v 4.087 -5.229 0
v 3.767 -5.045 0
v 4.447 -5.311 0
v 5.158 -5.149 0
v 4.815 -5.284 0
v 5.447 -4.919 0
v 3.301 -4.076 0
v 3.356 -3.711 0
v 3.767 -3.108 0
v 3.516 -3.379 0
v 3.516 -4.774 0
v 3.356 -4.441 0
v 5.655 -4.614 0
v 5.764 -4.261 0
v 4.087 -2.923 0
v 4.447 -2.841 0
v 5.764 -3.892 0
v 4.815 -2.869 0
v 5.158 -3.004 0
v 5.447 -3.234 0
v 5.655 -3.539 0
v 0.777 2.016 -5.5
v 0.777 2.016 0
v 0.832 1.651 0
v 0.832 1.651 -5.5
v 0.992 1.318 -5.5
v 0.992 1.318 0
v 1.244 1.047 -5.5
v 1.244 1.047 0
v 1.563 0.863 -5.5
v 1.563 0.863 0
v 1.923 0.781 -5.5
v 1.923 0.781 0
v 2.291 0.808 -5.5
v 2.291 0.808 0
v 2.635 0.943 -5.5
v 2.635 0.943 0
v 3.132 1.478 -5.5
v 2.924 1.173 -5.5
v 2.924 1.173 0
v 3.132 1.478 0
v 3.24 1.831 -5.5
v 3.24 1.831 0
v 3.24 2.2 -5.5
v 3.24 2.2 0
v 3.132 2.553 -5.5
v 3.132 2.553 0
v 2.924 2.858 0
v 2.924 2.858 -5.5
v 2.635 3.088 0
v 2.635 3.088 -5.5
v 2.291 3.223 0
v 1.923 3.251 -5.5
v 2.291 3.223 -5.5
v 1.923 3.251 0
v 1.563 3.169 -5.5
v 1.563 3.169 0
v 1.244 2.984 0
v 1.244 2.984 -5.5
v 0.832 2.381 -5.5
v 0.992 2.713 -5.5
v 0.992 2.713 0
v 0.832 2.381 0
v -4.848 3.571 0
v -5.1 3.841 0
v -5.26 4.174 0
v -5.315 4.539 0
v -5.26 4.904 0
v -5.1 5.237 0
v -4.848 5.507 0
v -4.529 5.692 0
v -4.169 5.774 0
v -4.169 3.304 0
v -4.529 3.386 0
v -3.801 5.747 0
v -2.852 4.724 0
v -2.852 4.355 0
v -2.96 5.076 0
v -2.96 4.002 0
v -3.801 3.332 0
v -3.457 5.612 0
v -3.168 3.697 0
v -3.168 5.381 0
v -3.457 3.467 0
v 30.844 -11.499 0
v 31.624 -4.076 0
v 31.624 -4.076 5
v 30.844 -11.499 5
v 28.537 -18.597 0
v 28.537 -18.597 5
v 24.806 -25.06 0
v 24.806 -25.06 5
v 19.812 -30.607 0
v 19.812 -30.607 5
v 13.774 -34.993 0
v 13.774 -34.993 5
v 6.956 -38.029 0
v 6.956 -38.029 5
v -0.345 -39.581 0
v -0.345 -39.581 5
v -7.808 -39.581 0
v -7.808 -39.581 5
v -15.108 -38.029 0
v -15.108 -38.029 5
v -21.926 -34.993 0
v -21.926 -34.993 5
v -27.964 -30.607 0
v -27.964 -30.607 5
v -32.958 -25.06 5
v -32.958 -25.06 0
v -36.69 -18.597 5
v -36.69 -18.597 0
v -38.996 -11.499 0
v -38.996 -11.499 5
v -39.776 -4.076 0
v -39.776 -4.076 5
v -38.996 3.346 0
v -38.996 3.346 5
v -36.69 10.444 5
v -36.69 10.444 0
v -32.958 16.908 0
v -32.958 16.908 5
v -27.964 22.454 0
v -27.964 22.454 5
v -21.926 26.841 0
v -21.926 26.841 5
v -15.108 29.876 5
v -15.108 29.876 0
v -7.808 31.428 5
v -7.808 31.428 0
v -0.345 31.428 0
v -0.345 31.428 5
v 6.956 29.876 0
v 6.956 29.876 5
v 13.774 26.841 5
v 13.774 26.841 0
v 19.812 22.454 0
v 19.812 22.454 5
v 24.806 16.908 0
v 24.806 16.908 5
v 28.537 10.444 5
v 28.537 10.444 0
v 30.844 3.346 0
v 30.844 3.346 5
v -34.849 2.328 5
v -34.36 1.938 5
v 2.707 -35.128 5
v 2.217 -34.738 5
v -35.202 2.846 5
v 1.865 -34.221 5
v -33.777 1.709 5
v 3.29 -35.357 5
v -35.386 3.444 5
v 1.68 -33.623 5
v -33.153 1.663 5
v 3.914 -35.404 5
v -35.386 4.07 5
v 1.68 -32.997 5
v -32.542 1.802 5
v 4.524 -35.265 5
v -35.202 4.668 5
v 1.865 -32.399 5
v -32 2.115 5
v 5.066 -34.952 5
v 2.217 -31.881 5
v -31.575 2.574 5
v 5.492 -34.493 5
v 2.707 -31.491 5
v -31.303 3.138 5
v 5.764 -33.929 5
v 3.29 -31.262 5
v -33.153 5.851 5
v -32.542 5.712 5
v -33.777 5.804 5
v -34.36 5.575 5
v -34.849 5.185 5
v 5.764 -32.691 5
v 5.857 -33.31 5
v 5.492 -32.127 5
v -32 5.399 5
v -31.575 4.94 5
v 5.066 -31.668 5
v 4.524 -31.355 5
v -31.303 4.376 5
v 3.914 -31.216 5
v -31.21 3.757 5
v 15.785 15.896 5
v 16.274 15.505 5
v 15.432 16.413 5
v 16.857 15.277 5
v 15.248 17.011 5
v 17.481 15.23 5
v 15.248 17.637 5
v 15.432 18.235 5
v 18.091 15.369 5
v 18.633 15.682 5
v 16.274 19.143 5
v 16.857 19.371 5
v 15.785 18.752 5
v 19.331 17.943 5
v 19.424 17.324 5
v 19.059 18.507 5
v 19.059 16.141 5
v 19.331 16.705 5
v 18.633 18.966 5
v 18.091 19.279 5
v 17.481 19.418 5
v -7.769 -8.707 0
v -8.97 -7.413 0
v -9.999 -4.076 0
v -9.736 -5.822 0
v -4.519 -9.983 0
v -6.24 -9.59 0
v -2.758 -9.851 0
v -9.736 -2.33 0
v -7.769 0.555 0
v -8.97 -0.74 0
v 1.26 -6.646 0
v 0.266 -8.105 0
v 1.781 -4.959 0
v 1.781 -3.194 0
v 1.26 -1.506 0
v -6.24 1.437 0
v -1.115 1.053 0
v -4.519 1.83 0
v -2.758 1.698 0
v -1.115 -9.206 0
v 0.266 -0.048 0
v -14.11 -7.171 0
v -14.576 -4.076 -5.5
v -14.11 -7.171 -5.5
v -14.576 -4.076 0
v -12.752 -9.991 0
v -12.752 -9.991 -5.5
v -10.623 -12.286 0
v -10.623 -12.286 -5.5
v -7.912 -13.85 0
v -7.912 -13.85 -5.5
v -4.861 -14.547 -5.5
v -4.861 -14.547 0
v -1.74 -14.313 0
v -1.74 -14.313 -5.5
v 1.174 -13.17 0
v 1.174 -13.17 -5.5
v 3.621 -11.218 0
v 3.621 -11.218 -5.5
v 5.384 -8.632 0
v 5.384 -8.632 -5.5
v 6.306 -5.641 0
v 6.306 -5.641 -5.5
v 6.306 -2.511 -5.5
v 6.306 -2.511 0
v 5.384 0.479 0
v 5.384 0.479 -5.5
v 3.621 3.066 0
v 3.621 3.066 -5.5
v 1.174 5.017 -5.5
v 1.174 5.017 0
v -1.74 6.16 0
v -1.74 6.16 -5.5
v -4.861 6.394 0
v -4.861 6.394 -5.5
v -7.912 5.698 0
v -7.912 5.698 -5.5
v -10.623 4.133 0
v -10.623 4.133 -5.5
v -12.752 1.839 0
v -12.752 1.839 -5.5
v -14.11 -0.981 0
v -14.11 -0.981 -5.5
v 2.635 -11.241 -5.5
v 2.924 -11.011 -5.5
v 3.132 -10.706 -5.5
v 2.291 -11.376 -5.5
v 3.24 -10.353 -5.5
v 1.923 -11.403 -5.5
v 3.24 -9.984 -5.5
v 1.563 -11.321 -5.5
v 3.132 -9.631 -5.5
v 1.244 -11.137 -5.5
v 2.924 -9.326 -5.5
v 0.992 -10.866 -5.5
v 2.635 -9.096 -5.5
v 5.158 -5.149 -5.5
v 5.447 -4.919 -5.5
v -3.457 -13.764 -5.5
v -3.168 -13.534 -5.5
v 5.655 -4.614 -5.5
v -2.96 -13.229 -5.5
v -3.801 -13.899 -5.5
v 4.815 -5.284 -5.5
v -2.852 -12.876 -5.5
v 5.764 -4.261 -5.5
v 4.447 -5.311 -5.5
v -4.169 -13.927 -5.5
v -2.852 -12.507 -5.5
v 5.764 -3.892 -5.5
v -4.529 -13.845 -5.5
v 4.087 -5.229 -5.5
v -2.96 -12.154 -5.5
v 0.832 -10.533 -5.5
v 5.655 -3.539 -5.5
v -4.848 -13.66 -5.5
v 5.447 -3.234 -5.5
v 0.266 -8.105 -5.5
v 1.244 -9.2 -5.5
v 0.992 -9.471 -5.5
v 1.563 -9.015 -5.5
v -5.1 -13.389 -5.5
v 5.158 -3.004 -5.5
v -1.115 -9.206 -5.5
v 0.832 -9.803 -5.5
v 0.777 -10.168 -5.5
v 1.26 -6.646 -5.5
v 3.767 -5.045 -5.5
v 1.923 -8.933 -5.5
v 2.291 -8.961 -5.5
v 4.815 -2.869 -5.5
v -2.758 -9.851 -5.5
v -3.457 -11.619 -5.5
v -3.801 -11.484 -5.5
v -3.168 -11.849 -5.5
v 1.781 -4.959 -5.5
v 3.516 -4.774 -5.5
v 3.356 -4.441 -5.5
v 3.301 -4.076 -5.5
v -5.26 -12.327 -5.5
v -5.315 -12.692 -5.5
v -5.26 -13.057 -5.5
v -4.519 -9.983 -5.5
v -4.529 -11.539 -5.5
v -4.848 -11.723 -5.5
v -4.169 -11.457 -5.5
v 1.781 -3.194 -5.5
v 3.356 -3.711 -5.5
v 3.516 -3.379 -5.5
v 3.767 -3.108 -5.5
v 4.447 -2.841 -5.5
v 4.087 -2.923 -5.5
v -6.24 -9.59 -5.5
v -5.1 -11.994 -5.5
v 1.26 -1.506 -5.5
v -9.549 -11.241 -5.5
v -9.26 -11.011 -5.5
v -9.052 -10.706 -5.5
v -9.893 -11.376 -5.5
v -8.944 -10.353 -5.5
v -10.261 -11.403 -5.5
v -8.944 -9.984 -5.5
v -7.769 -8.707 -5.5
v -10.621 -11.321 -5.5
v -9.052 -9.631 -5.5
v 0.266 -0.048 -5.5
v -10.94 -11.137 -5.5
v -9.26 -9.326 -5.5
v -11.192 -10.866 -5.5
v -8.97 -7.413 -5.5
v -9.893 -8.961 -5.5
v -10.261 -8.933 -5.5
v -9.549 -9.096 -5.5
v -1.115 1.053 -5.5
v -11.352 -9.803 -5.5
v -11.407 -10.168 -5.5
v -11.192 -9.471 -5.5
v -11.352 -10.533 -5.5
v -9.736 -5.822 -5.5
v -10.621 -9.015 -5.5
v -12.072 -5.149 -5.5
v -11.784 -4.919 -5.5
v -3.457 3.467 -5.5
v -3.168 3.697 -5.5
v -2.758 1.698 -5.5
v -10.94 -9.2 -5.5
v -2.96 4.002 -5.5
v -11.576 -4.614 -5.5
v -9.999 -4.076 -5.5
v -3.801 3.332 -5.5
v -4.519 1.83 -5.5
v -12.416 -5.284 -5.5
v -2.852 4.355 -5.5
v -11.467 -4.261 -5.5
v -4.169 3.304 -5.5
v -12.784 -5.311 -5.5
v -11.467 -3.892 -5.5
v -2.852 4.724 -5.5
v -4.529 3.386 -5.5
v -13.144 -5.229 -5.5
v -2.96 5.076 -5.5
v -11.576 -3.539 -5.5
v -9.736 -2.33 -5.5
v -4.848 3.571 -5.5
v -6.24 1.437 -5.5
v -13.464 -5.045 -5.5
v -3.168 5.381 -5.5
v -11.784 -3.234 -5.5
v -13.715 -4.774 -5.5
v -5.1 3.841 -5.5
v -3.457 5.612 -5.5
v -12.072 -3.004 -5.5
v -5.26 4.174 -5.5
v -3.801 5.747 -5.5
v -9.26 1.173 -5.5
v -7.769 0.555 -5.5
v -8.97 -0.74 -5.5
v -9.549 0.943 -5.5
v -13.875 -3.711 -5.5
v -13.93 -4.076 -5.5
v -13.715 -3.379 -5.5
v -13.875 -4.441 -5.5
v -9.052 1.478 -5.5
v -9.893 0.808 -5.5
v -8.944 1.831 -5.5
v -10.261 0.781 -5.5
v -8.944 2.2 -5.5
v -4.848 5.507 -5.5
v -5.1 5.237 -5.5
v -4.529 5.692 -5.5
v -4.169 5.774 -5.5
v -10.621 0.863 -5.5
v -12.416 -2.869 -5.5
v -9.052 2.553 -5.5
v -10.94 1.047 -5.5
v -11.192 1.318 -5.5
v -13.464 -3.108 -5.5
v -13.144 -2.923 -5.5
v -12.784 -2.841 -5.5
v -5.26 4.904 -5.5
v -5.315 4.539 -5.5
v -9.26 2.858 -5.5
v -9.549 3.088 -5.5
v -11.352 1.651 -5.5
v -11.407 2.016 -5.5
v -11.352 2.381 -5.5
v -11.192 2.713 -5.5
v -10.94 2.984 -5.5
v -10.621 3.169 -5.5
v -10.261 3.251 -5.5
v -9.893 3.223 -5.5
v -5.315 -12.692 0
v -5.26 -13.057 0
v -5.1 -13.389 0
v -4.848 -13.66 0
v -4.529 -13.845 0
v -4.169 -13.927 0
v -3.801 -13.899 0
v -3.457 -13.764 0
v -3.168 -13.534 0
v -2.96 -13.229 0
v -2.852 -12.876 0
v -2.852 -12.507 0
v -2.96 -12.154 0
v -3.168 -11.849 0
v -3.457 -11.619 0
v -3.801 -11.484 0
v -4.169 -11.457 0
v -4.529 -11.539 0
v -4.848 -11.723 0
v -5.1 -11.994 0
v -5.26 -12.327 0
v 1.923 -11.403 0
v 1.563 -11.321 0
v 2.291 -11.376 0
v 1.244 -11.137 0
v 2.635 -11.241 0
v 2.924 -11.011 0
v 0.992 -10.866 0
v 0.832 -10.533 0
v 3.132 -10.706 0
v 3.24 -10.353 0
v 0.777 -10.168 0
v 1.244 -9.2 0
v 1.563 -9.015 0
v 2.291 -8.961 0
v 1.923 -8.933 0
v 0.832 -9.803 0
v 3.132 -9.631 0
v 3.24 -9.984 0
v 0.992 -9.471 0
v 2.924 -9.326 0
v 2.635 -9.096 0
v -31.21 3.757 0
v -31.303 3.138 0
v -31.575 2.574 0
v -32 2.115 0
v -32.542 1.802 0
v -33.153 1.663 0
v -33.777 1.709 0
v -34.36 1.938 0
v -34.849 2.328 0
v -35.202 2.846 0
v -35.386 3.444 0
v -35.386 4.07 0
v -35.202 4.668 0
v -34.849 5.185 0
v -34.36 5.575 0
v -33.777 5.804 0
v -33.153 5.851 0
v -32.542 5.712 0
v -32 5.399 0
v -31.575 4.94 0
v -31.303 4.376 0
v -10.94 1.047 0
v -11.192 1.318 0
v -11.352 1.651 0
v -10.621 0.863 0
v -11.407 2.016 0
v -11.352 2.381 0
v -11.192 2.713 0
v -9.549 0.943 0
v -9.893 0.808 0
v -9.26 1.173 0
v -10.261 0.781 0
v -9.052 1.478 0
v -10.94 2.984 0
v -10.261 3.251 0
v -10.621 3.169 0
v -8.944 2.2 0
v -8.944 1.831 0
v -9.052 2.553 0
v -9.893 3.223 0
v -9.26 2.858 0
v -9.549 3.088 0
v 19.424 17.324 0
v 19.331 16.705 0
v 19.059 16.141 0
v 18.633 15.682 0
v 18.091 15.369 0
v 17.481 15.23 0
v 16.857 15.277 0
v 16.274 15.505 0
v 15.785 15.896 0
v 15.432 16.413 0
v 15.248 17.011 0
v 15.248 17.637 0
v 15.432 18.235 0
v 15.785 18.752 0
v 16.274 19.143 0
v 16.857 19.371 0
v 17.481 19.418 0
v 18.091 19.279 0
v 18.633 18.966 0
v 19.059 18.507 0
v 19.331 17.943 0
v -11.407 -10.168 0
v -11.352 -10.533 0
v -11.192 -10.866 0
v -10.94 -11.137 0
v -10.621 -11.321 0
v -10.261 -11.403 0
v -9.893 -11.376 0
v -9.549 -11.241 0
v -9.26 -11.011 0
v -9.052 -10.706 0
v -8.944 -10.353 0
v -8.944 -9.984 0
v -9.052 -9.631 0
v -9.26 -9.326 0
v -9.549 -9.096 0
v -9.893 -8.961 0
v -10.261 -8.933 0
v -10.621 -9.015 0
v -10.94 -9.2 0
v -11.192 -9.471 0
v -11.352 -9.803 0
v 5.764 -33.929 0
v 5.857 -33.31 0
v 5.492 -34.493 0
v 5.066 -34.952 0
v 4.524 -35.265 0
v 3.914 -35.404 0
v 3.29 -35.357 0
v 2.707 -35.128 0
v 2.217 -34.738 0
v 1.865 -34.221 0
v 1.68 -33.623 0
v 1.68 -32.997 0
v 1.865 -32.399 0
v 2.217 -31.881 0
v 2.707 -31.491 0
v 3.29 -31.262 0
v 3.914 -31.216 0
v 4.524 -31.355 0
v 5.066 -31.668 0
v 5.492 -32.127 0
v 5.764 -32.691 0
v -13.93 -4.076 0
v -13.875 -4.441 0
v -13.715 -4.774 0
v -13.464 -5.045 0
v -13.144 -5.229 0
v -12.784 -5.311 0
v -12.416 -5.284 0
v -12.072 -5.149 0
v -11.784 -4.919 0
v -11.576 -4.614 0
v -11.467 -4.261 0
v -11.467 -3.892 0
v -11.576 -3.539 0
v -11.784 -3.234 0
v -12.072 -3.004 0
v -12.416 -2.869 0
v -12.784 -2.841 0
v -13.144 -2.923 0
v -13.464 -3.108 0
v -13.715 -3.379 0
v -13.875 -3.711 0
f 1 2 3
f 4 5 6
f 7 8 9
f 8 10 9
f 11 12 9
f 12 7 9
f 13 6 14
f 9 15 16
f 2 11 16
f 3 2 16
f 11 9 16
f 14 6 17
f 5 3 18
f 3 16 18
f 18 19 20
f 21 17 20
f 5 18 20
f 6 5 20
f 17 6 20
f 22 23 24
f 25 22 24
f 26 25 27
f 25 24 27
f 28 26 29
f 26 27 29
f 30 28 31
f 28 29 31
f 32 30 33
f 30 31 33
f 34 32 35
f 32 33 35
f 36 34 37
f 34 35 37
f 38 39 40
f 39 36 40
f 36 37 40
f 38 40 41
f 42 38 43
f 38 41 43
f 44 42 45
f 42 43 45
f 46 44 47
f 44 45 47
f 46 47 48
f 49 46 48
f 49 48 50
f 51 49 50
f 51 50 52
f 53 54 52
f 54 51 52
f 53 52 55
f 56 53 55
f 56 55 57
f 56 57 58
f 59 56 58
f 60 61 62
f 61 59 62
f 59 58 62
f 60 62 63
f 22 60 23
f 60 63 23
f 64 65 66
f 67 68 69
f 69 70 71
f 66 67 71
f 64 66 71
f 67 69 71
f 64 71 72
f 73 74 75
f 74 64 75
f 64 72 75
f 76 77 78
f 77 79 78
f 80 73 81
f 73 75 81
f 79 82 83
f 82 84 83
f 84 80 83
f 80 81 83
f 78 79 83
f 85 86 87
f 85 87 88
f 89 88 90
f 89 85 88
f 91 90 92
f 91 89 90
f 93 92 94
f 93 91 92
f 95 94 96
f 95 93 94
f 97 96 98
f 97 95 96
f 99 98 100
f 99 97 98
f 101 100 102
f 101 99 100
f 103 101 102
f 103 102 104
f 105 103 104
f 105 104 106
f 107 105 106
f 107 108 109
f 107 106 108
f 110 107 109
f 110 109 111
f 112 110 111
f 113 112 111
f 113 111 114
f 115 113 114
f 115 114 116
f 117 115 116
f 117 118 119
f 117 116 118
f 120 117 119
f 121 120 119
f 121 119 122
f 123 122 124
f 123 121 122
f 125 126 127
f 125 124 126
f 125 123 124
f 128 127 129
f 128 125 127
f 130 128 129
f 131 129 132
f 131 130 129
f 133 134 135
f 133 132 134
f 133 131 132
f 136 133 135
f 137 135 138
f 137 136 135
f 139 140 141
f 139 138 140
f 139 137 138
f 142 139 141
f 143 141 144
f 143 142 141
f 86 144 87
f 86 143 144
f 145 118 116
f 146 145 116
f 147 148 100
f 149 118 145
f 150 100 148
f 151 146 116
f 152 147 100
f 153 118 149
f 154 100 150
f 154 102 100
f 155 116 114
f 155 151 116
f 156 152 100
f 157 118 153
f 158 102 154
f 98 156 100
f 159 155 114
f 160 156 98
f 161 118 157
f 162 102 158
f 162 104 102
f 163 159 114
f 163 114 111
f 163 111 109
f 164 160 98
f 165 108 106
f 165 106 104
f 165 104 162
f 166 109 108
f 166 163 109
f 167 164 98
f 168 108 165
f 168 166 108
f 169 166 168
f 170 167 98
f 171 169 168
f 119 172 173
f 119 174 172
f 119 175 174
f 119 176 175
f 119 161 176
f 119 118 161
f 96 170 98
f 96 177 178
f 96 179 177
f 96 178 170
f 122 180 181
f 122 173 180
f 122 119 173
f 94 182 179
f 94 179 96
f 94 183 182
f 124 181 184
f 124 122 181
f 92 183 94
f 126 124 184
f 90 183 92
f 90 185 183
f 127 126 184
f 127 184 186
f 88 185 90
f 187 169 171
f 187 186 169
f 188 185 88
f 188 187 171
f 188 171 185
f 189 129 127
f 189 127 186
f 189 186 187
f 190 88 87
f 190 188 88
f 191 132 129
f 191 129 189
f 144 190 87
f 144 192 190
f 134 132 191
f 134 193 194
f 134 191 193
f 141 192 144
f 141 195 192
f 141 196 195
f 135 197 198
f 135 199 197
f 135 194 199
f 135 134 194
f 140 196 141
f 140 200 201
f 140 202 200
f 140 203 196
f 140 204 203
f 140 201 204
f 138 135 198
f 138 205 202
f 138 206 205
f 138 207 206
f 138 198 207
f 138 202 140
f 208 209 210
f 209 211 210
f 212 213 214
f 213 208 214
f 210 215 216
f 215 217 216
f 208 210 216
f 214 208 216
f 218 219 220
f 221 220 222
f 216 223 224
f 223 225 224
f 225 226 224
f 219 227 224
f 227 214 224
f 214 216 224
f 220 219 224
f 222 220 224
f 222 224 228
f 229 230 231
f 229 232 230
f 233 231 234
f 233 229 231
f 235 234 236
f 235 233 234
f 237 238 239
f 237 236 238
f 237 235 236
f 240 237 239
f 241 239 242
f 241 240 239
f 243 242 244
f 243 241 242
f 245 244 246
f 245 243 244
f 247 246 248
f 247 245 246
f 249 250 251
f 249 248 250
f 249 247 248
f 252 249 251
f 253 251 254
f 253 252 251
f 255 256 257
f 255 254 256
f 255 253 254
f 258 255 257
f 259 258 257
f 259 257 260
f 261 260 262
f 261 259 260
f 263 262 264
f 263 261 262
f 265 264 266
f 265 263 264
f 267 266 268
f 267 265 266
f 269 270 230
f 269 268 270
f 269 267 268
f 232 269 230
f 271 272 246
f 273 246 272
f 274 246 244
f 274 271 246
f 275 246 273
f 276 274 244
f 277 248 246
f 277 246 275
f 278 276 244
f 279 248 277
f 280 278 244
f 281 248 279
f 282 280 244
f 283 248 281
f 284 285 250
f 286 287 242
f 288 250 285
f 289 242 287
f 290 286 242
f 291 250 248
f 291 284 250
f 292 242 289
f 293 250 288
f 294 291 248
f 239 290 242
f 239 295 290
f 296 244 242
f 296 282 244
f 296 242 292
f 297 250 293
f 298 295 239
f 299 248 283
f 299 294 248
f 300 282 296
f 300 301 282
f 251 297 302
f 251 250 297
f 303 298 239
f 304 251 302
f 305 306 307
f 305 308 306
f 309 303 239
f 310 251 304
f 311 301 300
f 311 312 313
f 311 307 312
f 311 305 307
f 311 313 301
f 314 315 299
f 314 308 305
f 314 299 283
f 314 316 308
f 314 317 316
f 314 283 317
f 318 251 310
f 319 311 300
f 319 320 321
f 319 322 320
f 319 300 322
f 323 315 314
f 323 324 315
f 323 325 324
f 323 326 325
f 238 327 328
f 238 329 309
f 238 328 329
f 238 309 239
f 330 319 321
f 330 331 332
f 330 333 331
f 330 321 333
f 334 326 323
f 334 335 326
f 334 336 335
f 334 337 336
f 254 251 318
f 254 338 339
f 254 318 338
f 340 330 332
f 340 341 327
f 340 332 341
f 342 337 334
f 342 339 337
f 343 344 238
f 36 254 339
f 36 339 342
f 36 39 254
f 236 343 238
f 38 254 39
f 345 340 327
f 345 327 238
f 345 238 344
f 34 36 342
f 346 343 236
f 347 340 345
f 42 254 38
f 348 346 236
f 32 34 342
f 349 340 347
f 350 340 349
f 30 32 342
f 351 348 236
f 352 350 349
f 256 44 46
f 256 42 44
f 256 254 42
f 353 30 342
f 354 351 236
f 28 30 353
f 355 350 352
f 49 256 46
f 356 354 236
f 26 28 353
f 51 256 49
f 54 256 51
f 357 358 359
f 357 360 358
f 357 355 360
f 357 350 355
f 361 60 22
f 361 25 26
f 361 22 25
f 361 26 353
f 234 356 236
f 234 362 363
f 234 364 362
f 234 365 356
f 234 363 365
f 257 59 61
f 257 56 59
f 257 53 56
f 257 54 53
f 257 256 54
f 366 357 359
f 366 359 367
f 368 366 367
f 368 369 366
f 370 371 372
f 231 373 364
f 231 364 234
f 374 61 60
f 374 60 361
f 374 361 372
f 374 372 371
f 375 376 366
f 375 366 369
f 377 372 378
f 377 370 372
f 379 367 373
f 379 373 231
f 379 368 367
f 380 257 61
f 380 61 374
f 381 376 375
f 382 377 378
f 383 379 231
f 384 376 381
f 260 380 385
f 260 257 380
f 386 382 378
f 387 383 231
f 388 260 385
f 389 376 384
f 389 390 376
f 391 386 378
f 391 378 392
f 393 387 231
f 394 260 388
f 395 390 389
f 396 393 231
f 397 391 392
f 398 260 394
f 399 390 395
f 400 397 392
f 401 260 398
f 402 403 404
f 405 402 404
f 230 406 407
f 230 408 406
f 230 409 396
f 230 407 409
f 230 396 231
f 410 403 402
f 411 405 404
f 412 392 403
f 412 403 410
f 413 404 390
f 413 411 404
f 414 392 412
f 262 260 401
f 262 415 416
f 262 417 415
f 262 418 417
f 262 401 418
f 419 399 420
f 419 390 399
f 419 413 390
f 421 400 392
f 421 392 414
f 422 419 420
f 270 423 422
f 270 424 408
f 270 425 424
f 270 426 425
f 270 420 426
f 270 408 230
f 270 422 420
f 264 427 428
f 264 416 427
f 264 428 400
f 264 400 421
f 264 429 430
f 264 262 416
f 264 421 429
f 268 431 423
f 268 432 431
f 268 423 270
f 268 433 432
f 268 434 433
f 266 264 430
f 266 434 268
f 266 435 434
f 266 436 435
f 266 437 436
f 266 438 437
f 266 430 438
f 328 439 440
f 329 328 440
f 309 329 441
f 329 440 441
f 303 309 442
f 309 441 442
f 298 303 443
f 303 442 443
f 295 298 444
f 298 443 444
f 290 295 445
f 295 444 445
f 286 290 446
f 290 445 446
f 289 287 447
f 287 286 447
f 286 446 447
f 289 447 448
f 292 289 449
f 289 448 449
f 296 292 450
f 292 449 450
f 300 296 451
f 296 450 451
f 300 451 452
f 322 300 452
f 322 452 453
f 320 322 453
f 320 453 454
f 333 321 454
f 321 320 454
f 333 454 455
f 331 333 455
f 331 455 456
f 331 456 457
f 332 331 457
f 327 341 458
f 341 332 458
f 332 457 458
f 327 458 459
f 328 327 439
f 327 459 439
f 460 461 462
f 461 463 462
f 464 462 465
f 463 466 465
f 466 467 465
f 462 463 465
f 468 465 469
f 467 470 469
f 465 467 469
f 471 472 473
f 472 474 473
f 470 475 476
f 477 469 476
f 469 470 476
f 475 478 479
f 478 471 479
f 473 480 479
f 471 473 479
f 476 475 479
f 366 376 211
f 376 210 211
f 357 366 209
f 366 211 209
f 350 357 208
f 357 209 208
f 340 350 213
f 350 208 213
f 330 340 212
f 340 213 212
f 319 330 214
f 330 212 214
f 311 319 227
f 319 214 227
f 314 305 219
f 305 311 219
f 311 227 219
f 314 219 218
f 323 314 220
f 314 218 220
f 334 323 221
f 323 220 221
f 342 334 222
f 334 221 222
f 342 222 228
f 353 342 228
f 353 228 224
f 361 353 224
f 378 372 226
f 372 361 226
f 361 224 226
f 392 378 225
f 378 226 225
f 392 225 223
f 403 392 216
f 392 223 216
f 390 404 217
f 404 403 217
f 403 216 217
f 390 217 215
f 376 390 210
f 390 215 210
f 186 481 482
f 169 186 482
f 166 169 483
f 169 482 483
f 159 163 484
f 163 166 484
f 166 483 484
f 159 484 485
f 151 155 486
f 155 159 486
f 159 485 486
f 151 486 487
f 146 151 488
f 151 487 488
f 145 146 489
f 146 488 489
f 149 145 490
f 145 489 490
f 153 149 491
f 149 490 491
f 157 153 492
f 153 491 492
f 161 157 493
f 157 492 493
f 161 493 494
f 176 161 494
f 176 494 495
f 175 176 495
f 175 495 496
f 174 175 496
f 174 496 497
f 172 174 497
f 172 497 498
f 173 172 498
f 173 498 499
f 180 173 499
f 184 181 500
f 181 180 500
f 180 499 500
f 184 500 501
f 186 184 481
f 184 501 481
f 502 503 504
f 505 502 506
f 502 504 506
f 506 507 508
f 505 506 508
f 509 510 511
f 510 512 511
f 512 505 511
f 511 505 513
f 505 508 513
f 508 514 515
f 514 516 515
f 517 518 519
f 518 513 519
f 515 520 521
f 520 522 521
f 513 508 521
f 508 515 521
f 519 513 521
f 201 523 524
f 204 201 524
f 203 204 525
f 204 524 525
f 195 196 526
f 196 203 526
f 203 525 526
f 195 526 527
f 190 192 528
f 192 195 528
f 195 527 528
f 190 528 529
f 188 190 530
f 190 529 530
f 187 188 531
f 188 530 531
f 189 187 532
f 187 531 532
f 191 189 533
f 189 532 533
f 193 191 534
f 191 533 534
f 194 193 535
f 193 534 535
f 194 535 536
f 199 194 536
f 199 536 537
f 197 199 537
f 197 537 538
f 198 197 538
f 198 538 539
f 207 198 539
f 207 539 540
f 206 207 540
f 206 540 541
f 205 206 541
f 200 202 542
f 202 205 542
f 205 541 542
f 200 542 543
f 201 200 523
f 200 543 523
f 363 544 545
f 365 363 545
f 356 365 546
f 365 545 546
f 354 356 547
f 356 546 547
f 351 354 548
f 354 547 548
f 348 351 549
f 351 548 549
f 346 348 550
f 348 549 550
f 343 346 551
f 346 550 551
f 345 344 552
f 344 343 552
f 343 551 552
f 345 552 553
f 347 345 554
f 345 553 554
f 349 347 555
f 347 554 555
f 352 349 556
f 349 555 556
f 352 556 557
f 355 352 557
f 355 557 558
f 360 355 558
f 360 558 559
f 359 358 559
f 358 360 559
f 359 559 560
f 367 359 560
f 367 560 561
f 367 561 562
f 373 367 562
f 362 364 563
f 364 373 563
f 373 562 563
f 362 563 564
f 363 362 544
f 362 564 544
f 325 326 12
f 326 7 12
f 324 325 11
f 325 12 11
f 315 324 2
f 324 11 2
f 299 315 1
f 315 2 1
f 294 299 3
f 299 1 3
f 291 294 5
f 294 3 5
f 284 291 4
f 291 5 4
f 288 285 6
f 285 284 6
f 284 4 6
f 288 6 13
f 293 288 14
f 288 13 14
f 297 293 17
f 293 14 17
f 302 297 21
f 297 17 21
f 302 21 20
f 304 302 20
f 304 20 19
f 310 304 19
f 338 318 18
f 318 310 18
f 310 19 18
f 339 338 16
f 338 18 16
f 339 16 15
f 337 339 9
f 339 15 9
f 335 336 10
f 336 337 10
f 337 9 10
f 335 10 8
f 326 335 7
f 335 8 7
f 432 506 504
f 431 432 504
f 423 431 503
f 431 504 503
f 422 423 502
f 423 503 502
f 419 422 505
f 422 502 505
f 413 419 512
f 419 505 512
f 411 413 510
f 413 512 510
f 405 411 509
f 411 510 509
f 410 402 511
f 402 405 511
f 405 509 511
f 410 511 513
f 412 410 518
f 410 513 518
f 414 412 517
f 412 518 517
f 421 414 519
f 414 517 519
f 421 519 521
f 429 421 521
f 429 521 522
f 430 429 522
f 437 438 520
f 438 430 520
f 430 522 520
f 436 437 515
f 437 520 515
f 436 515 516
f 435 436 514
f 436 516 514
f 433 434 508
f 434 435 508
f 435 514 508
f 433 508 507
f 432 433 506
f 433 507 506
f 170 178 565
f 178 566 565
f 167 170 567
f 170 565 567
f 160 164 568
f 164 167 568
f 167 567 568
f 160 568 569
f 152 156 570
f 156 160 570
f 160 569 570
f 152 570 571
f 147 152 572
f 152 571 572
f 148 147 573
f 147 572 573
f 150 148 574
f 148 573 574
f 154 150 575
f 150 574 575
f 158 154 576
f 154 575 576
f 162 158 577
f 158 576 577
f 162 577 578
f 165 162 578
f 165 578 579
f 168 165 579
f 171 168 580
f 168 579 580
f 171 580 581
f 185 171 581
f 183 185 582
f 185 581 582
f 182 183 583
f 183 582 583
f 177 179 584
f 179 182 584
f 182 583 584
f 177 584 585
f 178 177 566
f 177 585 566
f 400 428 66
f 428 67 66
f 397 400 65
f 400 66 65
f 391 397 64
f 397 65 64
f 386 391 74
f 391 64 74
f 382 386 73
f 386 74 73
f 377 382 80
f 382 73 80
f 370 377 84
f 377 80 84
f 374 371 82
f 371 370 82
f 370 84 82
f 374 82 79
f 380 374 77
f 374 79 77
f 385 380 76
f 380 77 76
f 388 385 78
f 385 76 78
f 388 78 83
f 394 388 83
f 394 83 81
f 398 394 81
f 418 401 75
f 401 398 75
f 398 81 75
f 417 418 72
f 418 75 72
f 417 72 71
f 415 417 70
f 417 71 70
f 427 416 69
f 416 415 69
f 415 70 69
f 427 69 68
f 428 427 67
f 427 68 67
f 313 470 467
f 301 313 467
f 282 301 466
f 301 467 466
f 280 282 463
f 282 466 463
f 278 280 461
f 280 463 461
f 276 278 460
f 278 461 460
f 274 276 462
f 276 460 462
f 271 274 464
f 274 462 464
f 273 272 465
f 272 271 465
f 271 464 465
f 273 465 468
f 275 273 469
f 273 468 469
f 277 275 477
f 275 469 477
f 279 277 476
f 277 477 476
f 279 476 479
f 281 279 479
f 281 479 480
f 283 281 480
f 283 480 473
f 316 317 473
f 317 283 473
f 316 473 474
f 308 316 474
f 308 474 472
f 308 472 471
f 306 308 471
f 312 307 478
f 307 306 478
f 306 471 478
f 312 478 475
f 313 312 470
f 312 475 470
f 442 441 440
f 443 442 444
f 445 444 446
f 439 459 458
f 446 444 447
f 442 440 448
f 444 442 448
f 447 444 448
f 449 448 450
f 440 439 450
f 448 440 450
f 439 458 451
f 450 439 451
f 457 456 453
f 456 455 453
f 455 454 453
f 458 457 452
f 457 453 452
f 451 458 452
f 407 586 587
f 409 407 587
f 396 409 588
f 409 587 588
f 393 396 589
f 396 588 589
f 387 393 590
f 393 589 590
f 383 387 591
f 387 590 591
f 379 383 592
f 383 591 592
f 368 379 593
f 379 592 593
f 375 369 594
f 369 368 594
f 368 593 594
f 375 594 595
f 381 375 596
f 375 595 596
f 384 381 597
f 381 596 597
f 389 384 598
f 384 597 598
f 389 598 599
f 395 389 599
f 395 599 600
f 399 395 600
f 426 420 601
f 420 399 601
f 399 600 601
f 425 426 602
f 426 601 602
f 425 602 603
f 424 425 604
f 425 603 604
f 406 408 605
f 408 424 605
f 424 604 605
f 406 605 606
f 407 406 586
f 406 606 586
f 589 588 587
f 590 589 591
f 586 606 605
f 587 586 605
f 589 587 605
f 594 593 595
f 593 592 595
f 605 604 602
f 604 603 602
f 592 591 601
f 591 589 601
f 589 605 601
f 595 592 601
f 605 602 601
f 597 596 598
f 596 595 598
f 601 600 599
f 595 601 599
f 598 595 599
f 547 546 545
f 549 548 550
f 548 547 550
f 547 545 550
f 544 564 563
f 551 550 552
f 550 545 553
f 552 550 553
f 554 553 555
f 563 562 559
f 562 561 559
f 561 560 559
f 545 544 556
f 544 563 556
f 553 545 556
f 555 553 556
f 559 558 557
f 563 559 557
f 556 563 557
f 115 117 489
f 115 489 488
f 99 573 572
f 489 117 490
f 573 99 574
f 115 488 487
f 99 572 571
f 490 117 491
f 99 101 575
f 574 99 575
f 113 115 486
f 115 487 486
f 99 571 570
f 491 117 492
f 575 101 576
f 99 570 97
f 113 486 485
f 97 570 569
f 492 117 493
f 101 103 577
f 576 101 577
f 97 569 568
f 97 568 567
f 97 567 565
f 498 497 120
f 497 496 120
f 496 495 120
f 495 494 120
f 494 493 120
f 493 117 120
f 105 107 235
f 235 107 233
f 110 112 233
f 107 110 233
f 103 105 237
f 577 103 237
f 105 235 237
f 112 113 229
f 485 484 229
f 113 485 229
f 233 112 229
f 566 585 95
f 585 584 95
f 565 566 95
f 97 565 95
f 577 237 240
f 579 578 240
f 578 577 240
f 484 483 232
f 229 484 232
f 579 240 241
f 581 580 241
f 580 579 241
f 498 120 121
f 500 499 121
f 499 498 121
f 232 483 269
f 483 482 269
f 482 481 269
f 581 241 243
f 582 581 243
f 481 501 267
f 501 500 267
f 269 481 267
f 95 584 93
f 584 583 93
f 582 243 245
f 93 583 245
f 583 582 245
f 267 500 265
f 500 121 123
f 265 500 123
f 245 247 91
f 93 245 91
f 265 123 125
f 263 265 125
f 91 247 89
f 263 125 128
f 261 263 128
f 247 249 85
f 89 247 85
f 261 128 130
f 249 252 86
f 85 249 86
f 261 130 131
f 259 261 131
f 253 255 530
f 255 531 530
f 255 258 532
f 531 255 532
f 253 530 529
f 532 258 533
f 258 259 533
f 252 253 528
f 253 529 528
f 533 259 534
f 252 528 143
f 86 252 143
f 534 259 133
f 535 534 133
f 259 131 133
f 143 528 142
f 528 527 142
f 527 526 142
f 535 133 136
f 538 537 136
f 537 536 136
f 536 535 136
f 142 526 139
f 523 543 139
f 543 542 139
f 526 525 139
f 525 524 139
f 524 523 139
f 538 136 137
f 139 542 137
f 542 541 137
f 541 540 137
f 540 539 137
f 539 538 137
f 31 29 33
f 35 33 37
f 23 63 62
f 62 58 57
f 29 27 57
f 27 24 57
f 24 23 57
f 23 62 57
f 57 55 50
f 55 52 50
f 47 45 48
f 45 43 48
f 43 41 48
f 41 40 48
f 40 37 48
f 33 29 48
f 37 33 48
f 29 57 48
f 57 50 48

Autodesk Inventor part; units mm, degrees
ref_plane "YZ Plane" through (0, 0, 0) normal (1, 0, 0) x (0, 1, 0)
ref_plane "XZ Plane" through (0, 0, 0) normal (0, 1, 0) x (-1, 0, 0)
ref_plane "XY Plane" through (0, 0, 0) normal (0, 0, 1) x (1, 0, 0)
sketch "スケッチ1" plane through (0, 0, 0) normal (0, 0, 1) x (1, 0, 0)
  circle A0 centre (-4.0763, -4.0763) radius 35.7
  circle A1 centre (-4.0763, -4.0763) radius 35.7
  circle A2 centre (-33.3097, 3.7568) radius 2.1
  circle A3 centre (3.7568, -33.3097) radius 2.1
  circle A4 centre (17.3241, 17.3241) radius 2.1
  dimension "d0" = 4.2
  dimension "d1" = 4.2
  dimension "d2" = 4.2
  dimension "d3" = 71.4
extrude "押し出し1" add sketch "スケッチ1" along normal blind 5
sketch "スケッチ3" plane through (-4.0763, -4.0763, 0) normal (0, 0, -1) x (-1, 0, 0)
  circle A0 centre (0, 0) radius 10.5
  circle A1 centre (-6.092, 6.092) radius 1.2385
  circle A2 centre (-8.6154, 0) radius 1.2385
  circle A3 centre (-6.092, -6.092) radius 1.2385
  circle A4 centre (0, -8.6154) radius 1.2385
  circle A5 centre (6.092, -6.092) radius 1.2385
  circle A6 centre (0, 8.6154) radius 1.2385
  circle A7 centre (6.092, 6.092) radius 1.2385
  circle A8 centre (8.6154, 0) radius 1.2385
  circle A9 centre (0, 0) radius 5.9231
  point P0 (-4.0763, 4.0763)
  dimension "d12" = 21
extrude "押し出し3" add sketch "スケッチ3" along normal blind 5.5
properties part number "rotate_plate_2"
